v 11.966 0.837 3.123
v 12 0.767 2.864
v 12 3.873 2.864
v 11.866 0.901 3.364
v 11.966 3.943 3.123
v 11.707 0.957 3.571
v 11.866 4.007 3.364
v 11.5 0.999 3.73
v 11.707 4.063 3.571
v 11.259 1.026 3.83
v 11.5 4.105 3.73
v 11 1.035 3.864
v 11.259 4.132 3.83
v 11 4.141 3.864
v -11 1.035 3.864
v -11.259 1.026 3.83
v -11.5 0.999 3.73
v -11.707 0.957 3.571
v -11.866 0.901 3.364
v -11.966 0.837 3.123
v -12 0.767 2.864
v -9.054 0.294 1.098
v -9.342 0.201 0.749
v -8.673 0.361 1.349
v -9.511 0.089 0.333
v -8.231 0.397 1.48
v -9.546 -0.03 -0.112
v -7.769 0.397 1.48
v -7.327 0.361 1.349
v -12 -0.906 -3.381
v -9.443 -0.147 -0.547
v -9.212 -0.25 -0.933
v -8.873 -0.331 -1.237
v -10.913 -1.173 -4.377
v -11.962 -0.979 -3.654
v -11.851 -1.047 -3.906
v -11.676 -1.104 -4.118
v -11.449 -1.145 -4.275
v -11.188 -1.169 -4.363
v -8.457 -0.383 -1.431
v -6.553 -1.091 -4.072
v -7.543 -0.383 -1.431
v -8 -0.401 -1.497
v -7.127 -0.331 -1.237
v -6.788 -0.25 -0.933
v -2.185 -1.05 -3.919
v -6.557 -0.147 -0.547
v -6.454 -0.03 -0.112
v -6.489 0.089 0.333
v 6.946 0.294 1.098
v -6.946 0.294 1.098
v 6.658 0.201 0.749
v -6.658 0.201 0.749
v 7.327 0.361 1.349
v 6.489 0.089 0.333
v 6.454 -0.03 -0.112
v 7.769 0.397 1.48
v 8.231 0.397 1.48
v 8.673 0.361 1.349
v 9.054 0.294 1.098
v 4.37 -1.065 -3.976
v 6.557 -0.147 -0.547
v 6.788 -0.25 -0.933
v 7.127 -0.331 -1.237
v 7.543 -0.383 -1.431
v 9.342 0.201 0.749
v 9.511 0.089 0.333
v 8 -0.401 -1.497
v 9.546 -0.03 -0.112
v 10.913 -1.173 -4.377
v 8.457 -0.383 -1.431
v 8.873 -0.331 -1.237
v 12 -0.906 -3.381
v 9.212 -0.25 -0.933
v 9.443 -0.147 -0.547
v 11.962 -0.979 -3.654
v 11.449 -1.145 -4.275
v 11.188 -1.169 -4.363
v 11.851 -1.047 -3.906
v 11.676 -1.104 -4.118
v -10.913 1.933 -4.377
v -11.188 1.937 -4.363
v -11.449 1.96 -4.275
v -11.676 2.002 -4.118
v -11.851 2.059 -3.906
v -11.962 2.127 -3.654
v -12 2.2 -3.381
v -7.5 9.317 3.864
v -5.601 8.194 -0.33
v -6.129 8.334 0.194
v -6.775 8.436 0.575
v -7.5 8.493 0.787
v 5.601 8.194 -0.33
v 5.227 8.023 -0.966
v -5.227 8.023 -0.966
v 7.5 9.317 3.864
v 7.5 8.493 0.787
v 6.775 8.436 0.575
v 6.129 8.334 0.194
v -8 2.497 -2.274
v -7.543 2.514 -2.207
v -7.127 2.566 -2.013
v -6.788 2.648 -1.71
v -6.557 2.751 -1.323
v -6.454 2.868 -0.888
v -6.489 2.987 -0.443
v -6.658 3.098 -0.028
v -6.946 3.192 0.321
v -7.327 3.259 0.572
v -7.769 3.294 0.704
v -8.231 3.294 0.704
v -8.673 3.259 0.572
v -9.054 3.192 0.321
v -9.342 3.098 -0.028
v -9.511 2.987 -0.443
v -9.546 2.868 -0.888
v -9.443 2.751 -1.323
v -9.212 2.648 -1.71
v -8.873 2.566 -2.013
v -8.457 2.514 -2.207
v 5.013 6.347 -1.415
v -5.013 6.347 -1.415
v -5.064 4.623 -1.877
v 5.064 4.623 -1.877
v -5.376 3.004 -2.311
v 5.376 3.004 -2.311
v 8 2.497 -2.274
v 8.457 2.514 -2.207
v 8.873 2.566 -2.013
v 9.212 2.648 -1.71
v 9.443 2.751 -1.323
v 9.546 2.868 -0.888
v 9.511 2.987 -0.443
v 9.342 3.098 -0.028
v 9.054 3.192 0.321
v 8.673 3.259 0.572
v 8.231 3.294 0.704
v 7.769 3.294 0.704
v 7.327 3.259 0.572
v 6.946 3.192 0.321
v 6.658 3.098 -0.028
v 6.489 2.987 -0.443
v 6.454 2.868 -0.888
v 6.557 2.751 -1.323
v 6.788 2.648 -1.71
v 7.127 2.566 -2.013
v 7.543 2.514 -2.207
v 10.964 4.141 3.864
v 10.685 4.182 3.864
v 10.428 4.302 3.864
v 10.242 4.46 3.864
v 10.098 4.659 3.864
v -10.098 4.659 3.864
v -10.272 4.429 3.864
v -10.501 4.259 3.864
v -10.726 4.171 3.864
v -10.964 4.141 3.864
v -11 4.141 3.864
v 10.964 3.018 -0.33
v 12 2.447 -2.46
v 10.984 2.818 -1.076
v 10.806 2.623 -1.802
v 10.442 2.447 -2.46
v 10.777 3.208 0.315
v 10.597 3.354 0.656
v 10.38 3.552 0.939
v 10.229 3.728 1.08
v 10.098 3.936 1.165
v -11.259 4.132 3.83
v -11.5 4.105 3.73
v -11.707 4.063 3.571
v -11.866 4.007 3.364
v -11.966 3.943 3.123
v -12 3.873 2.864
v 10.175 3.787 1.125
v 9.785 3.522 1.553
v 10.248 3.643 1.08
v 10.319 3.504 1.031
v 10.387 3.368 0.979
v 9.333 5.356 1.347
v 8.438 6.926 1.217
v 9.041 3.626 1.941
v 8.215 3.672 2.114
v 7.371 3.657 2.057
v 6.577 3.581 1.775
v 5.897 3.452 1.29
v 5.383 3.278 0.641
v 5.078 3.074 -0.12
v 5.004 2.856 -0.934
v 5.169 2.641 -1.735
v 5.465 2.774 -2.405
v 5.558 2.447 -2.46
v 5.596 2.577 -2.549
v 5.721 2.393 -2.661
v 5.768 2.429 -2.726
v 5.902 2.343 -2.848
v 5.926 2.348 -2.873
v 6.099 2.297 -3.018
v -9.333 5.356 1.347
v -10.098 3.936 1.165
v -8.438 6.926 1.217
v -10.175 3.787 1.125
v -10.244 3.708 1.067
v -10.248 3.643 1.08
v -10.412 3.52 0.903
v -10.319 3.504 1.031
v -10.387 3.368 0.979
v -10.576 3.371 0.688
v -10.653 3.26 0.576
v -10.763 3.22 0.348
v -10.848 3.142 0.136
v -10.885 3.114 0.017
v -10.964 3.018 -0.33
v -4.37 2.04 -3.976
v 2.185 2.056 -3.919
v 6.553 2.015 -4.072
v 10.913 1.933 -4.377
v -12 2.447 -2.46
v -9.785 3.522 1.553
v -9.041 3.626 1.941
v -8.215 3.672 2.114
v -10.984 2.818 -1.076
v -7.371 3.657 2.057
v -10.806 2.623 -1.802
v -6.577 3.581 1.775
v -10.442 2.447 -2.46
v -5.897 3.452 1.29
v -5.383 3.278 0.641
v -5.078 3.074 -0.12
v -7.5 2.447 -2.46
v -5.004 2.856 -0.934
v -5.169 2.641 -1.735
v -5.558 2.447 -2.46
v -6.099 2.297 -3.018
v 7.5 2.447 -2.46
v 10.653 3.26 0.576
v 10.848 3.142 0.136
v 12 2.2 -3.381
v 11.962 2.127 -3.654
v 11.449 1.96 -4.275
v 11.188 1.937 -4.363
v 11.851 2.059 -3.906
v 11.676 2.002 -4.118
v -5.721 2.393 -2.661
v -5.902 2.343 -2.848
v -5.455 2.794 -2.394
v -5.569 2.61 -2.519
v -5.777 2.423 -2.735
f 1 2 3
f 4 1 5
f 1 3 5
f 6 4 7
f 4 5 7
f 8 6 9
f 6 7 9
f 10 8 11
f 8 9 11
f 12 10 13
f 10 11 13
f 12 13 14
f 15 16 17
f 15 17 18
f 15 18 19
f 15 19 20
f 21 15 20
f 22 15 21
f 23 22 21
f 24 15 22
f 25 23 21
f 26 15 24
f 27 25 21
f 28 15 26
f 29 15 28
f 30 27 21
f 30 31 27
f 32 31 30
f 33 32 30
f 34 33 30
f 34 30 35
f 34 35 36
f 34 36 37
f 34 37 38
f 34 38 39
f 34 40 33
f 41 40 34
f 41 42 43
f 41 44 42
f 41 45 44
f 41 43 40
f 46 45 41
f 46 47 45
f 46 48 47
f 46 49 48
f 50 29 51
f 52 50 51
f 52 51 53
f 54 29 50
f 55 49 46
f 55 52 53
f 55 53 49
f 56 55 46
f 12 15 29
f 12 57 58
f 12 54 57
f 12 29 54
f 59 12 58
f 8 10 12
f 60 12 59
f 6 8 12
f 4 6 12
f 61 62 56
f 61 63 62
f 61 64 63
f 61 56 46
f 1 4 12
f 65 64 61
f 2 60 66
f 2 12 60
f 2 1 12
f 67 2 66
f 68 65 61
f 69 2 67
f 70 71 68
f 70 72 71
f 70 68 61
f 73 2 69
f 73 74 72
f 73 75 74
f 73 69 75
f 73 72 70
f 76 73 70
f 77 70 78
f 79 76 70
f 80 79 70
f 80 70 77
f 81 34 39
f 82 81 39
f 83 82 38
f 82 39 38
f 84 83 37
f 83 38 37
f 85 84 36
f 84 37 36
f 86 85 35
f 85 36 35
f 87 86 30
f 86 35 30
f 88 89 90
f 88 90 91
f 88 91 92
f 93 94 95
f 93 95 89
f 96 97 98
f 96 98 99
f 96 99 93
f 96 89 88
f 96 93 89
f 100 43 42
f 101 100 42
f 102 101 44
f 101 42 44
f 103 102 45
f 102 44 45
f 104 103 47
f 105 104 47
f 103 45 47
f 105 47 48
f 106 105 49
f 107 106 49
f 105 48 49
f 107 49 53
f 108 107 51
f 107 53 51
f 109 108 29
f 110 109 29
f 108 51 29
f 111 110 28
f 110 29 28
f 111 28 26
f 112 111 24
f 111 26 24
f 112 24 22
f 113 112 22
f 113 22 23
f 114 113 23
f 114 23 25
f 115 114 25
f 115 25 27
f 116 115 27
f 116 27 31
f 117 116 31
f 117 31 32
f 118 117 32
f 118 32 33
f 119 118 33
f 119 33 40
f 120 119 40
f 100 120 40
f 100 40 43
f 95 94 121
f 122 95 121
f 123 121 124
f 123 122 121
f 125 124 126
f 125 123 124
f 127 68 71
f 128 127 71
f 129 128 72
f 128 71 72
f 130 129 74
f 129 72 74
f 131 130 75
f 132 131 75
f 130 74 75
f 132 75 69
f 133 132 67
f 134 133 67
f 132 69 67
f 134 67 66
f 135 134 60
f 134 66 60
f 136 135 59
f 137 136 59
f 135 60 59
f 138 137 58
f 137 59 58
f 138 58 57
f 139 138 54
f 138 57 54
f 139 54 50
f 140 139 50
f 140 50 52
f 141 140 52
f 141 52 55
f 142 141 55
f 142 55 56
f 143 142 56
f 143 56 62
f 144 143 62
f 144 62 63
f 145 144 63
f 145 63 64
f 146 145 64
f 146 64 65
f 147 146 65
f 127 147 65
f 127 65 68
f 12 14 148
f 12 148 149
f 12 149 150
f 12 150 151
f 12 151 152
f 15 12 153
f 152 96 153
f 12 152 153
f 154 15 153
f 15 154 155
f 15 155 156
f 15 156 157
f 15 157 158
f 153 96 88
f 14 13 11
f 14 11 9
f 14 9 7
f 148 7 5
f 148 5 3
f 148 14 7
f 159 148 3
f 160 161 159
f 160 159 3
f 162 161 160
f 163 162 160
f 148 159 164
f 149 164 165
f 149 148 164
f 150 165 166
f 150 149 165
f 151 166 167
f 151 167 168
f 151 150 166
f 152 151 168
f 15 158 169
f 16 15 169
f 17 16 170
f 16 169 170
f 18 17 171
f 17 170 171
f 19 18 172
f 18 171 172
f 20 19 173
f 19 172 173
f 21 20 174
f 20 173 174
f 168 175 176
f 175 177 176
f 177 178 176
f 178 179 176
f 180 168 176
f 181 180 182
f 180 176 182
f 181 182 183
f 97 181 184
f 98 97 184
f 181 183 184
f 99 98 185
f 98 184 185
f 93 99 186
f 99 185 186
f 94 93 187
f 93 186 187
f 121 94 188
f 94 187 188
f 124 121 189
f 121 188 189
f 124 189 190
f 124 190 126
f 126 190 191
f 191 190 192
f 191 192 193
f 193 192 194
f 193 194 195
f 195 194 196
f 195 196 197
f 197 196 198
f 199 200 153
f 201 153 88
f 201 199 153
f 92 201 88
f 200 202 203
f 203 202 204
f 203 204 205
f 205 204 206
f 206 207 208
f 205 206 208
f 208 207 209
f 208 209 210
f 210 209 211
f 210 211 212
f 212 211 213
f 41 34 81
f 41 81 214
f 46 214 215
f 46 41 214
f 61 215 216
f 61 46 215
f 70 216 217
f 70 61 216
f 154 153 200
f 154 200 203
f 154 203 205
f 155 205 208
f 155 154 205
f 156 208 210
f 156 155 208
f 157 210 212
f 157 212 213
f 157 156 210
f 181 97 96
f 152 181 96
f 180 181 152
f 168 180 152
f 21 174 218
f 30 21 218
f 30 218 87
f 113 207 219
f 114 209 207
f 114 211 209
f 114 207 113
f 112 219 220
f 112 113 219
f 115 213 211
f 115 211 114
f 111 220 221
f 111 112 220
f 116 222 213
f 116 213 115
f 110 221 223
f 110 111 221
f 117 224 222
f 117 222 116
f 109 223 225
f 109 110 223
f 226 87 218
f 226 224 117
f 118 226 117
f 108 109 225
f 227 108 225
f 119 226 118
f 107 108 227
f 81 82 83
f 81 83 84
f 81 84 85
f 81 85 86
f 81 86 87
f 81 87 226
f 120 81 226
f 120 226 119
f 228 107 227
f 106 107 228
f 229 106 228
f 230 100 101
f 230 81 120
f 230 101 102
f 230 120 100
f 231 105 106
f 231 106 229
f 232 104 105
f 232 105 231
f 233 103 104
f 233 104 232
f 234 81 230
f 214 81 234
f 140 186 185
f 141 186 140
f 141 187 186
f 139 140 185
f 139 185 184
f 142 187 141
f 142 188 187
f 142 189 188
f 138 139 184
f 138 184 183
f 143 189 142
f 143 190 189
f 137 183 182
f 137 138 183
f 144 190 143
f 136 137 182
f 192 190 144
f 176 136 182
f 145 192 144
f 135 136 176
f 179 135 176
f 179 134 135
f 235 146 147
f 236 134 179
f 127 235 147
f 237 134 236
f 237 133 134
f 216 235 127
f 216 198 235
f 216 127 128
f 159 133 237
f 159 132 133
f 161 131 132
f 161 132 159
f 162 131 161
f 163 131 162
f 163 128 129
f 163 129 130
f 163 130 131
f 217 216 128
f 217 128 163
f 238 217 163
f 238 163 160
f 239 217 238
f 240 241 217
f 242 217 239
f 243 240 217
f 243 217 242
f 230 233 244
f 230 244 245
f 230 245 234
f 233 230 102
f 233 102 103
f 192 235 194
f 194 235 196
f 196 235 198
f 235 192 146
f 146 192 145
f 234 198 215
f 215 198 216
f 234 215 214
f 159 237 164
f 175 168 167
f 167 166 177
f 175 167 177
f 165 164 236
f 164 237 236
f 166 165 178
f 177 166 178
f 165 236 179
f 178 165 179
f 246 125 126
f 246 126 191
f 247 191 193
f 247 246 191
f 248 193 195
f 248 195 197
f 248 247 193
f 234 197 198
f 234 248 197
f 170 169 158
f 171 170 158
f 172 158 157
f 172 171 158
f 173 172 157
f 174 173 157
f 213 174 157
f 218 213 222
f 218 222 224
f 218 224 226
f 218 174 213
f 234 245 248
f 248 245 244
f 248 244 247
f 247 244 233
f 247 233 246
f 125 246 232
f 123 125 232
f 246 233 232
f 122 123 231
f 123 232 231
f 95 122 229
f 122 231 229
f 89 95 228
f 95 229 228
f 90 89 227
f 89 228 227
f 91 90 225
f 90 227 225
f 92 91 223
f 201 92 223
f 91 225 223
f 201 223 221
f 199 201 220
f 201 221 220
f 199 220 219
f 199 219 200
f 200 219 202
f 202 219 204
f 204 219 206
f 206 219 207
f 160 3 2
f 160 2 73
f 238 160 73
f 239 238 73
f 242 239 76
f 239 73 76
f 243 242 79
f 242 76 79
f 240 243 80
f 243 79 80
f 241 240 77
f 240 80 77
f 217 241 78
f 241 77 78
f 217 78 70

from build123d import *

# Parameters (mm, degrees)
BOSS_EXTRU_1_DEPTH            = 12
ESQUISSE2_R                   = 1.55
ENL_V_MAT_EXTRU_1_DEPTH       = 16.94179588
ENL_V_START                   = -3
ESQUISSE3_R                   = 3
ENL_V_MAT_EXTRU_2_DEPTH       = 25
ENL_V_MAT_EXTRU_3_DEPTH       = 16.94179588
ENL_V_MAT_EXTRU_3_DEPTH_BACK  = 16.94179588
ESQUISSE4_R                   = 125
ENL_V_START_2                 = -12
ENL_V_MAT_EXTRU_4_DEPTH       = 1.613248654
ENL_V_START_3                 = 10.386751346
ENL_V_MAT_EXTRU_4_2_DEPTH     = 1.613248654
ENL_V_START_4                 = -4.63527657
ENL_V_MAT_EXTRU_4_3_OUTLINE_W = 24
ENL_V_MAT_EXTRU_4_3_OUTLINE_H = 5
ENL_V_MAT_EXTRU_4_3_DEPTH     = 2.892118763
ENL_V_START_5                 = -1.893983464
ENL_V_MAT_EXTRU_4_4_DEPTH     = 8.893983464
ENL_V_START_6                 = -7.5
ENL_V_MAT_EXTRU_4_5_DEPTH     = 15
CONG_1_R                      = 1


with BuildPart() as part:
    # Esquisse1 → Boss.-Extru.1 (new, symmetric)
    with BuildSketch(Plane(origin=(0, 0, 0), x_dir=(0, 0, -1), z_dir=(1, 0, 0))):
        Polygon((-3.863703305, 1.03527618), (4.829629131, -1.294095226), (4.829629131, 6.988114218), (-3.863703305, 9.317485624), align=None)
    extrude(amount=BOSS_EXTRU_1_DEPTH, both=True)

    # Esquisse2 → Enlèv. mat.-Extru.1 (cut, through all)
    with BuildSketch(Plane(origin=(0, 0, 0), x_dir=(1, 0, 0), z_dir=(0, -0.9659258262890672, 0.2588190451025247))):
        with Locations(Location((-8, 0, 0), (0, 0, 270))):
            Circle(ESQUISSE2_R)
        with Locations(Location((8, 0, 0), (0, 0, 270))):
            Circle(ESQUISSE2_R)
    extrude(amount=-ENL_V_MAT_EXTRU_1_DEPTH, mode=Mode.SUBTRACT)

    # Esquisse3 → Enlèv. mat.-Extru.2 (cut)
    with BuildSketch(Plane(origin=(0, 0, 0), x_dir=(1, 0, 0), z_dir=(0, -0.9659258262890672, 0.2588190451025247)).offset(ENL_V_START)):
        with Locations(Location((-8, 0, 0), (0, 0, 270))):
            Circle(ESQUISSE3_R)
        with Locations(Location((8, 0, 0), (0, 0, 270))):
            Circle(ESQUISSE3_R)
    extrude(amount=-ENL_V_MAT_EXTRU_2_DEPTH, mode=Mode.SUBTRACT)

    # Esquisse4 → Enlèv. mat.-Extru.3 (cut, two sides: drawn at the far end of the back side and taken through both)
    with BuildSketch(Plane(origin=(0, 0, 0), x_dir=(1, 0, 0), z_dir=(0, 1, 0)).offset(-ENL_V_MAT_EXTRU_3_DEPTH_BACK)):
        with Locations((0, 128.9)):
            Circle(ESQUISSE4_R)
    extrude(amount=ENL_V_MAT_EXTRU_3_DEPTH + ENL_V_MAT_EXTRU_3_DEPTH_BACK, mode=Mode.SUBTRACT)

    # Enlèv. mat.-Extru.4: read off the stored shape, not the designer's step
    # Enlèv. mat.-Extru.4 outline → Enlèv. mat.-Extru.4 (cut)
    with BuildSketch(Plane.YZ.offset(ENL_V_START_2)):
        Polygon((9.317485624, 3.863703305), (4.141104722, 3.863703305), (2.44661504, -2.46021828), (8.023390398, -0.965925826), align=None)
    extrude(amount=ENL_V_MAT_EXTRU_4_DEPTH, mode=Mode.SUBTRACT)

    # Enl_v. mat.-Extru.4 2 outline → Enl_v. mat.-Extru.4 2 (cut)
    with BuildSketch(Plane.YZ.offset(ENL_V_START_3)):
        Polygon((9.317485624, 3.863703305), (4.141104722, 3.863703305), (2.44661504, -2.46021828), (8.023390398, -0.965925826), align=None)
    extrude(amount=ENL_V_MAT_EXTRU_4_2_DEPTH, mode=Mode.SUBTRACT)

    # Enl_v. mat.-Extru.4 3 outline → Enl_v. mat.-Extru.4 3 (cut)
    with BuildSketch(Plane(origin=(0, 0, 0), x_dir=(1, 0, 0), z_dir=(0, 0.25881904510252507, 0.9659258262890671)).offset(ENL_V_START_4)):
        with Locations((0, 5.5)):
            Rectangle(ENL_V_MAT_EXTRU_4_3_OUTLINE_W, ENL_V_MAT_EXTRU_4_3_OUTLINE_H)
    extrude(amount=ENL_V_MAT_EXTRU_4_3_DEPTH, mode=Mode.SUBTRACT)

    # Enl_v. mat.-Extru.4 4 outline → Enl_v. mat.-Extru.4 4 (cut)
    with BuildSketch(Plane(origin=(0, 0, 0), x_dir=(1, 0, 0), z_dir=(0, 0.25881904510252507, 0.9659258262890671)).offset(ENL_V_START_5)):
        Polygon((-12, 8), (-12, 3), (-10.386751346, 3), (-7.5, 8), align=None)
        Polygon((12, 8), (7.5, 8), (10.386751346, 3), (12, 3), align=None)
    extrude(amount=ENL_V_MAT_EXTRU_4_4_DEPTH, mode=Mode.SUBTRACT)

    # Enl_v. mat.-Extru.4 5 outline → Enl_v. mat.-Extru.4 5 (cut)
    with BuildSketch(Plane.YZ.offset(ENL_V_START_6)):
        Polygon((7.276244171, -3.754313506), (8.023390398, -0.965925826), (2.44661504, -2.46021828), align=None)
    extrude(amount=ENL_V_MAT_EXTRU_4_5_DEPTH, mode=Mode.SUBTRACT)

    # Congé1
    # the kernel refuses this fillet: 1 mm, written as the material it adds along each edge
    with BuildSketch(Plane(origin=(-10.386751346, 4.514677836, 5.257897145), x_dir=(-1, 0, 0), z_dir=(0, -0.2588190451454881, -0.9659258262775553))) as cong_1_piece_1_section:
        with BuildLine():
            CenterArc((CONG_1_R * 0.577350268999, CONG_1_R), CONG_1_R, 210, 60)
            Line((-CONG_1_R * 0.288675134782, CONG_1_R * 0.499999999993), (0, 0))
            Line((0, 0), (CONG_1_R * 0.577350268999, 0))
        make_face()
    cong_1_piece_1 = extrude(amount=5.873068178, mode=Mode.PRIVATE)
    cong_1_piece_1 = split(cong_1_piece_1, bisect_by=Plane(origin=(-10.386751346, 4.514677836, 3.863703305), z_dir=(0, 0, -1)), keep=Keep.TOP, mode=Mode.PRIVATE)
    cong_1_piece_1 = cong_1_piece_1 - Plane(origin=(-8, 2.897777479, -0.776457135), x_dir=(0, -0.25881904510252474, -0.9659258262890673), z_dir=(0, -0.9659258262890673, 0.25881904510252474)) * Cylinder(3, 15, mode=Mode.PRIVATE)
    add(cong_1_piece_1)
    with BuildSketch(Plane(origin=(-7.00177766, 2.44661504, -2.46021828), x_dir=(0, -0.2588190451025249, -0.9659258262890672), z_dir=(1, 0, 0))) as cong_1_piece_2_section:
        with BuildLine():
            CenterArc((CONG_1_R * 0.577350268769, CONG_1_R), CONG_1_R, 210.000000004, 59.999999996)
            Line((-CONG_1_R * 0.288675134977, CONG_1_R * 0.499999999934), (0, 0))
            Line((0, 0), (CONG_1_R * 0.577350268769, 0))
        make_face()
    cong_1_piece_2 = extrude(amount=14.003555319, mode=Mode.PRIVATE)
    cong_1_piece_2 = cong_1_piece_2 - Plane(origin=(-8, 2.897777479, -0.776457135), x_dir=(0, -0.25881904510252474, -0.9659258262890673), z_dir=(0, -0.9659258262890673, 0.25881904510252474)) * Cylinder(3, 31, mode=Mode.PRIVATE)
    cong_1_piece_2 = cong_1_piece_2 - Plane(origin=(8, 2.897777479, -0.776457135), x_dir=(0, -0.25881904510252474, -0.9659258262890673), z_dir=(0, -0.9659258262890673, 0.25881904510252474)) * Cylinder(3, 31, mode=Mode.PRIVATE)
    add(cong_1_piece_2)
    with BuildSketch(Plane(origin=(10.386751346, 4.514677836, 5.257897145), x_dir=(-0.5000000002478059, 0.8365163035896415, -0.22414386804219472), z_dir=(0, -0.2588190451454881, -0.9659258262775553))) as cong_1_piece_3_section:
        with BuildLine():
            CenterArc((CONG_1_R * 0.577350268999, CONG_1_R), CONG_1_R, 210.000000016, 60)
            Line((-CONG_1_R * 0.288675134643, CONG_1_R * 0.499999999752), (0, 0))
            Line((0, 0), (CONG_1_R * 0.577350269277, 0))
        make_face()
    cong_1_piece_3 = extrude(amount=5.873068178, mode=Mode.PRIVATE)
    cong_1_piece_3 = split(cong_1_piece_3, bisect_by=Plane(origin=(10.386751346, 4.514677836, 3.863703305), z_dir=(0, 0, -1)), keep=Keep.TOP, mode=Mode.PRIVATE)
    cong_1_piece_3 = cong_1_piece_3 - Plane(origin=(8, 2.897777479, -0.776457135), x_dir=(0, -0.25881904510252474, -0.9659258262890673), z_dir=(0, -0.9659258262890673, 0.25881904510252474)) * Cylinder(3, 15, mode=Mode.PRIVATE)
    add(cong_1_piece_3)
    # the kernel refuses this fillet: 1 mm, written as the material it takes off along each edge
    with BuildSketch(Plane(origin=(12, 6.641104722, 3.863703305), x_dir=(0, 0, -1), z_dir=(0, -1, 0))) as cong_1_2_piece_1:
        with BuildLine():
            CenterArc((CONG_1_R, -CONG_1_R), CONG_1_R, 90, 90)
            Line((0, -CONG_1_R), (0, 0))
            Line((0, 0), (CONG_1_R, 0))
        make_face()
    extrude(amount=8.105828542, mode=Mode.SUBTRACT)
    with BuildSketch(Plane(origin=(-12, 6.641104722, 3.863703305), x_dir=(0, 0, -1), z_dir=(0, -1, 0))) as cong_1_2_piece_2:
        with BuildLine():
            CenterArc((CONG_1_R, CONG_1_R), CONG_1_R, 180, 90)
            Line((0, CONG_1_R), (0, 0))
            Line((0, 0), (CONG_1_R, 0))
        make_face()
    extrude(amount=8.105828542, mode=Mode.SUBTRACT)
    with BuildSketch(Plane(origin=(-12, -3.940338157, -4.477333255), x_dir=(0, 0, 1), z_dir=(0, 1, 0))) as cong_1_2_piece_3:
        with BuildLine():
            CenterArc((1.096256131, 1), CONG_1_R, 174.991611749, 95.008388251)
            ThreePointArc((0.100074203, 1.087301587), (0.051224329, 0.543541522), (0, 0))
            Line((0, 0), (1.096256131, 0))
        make_face()
    extrude(amount=8.587109196, mode=Mode.SUBTRACT)
    with BuildSketch(Plane(origin=(12, -3.940338157, -4.477333255), x_dir=(-0.9957911285935623, 0, 0.09165166782093803), z_dir=(0, 1, 0))) as cong_1_2_piece_4:
        with BuildLine():
            CenterArc((1.096264831, 0.999990462), CONG_1_R, 174.741366539, 95.008388251)
            Line((0.100473703, 1.09164213), (0, 0))
            ThreePointArc((0, 0), (0.545948621, 0.001192245), (1.091897242, 0))
        make_face()
    extrude(amount=8.587109196, mode=Mode.SUBTRACT)


solid = part.part
